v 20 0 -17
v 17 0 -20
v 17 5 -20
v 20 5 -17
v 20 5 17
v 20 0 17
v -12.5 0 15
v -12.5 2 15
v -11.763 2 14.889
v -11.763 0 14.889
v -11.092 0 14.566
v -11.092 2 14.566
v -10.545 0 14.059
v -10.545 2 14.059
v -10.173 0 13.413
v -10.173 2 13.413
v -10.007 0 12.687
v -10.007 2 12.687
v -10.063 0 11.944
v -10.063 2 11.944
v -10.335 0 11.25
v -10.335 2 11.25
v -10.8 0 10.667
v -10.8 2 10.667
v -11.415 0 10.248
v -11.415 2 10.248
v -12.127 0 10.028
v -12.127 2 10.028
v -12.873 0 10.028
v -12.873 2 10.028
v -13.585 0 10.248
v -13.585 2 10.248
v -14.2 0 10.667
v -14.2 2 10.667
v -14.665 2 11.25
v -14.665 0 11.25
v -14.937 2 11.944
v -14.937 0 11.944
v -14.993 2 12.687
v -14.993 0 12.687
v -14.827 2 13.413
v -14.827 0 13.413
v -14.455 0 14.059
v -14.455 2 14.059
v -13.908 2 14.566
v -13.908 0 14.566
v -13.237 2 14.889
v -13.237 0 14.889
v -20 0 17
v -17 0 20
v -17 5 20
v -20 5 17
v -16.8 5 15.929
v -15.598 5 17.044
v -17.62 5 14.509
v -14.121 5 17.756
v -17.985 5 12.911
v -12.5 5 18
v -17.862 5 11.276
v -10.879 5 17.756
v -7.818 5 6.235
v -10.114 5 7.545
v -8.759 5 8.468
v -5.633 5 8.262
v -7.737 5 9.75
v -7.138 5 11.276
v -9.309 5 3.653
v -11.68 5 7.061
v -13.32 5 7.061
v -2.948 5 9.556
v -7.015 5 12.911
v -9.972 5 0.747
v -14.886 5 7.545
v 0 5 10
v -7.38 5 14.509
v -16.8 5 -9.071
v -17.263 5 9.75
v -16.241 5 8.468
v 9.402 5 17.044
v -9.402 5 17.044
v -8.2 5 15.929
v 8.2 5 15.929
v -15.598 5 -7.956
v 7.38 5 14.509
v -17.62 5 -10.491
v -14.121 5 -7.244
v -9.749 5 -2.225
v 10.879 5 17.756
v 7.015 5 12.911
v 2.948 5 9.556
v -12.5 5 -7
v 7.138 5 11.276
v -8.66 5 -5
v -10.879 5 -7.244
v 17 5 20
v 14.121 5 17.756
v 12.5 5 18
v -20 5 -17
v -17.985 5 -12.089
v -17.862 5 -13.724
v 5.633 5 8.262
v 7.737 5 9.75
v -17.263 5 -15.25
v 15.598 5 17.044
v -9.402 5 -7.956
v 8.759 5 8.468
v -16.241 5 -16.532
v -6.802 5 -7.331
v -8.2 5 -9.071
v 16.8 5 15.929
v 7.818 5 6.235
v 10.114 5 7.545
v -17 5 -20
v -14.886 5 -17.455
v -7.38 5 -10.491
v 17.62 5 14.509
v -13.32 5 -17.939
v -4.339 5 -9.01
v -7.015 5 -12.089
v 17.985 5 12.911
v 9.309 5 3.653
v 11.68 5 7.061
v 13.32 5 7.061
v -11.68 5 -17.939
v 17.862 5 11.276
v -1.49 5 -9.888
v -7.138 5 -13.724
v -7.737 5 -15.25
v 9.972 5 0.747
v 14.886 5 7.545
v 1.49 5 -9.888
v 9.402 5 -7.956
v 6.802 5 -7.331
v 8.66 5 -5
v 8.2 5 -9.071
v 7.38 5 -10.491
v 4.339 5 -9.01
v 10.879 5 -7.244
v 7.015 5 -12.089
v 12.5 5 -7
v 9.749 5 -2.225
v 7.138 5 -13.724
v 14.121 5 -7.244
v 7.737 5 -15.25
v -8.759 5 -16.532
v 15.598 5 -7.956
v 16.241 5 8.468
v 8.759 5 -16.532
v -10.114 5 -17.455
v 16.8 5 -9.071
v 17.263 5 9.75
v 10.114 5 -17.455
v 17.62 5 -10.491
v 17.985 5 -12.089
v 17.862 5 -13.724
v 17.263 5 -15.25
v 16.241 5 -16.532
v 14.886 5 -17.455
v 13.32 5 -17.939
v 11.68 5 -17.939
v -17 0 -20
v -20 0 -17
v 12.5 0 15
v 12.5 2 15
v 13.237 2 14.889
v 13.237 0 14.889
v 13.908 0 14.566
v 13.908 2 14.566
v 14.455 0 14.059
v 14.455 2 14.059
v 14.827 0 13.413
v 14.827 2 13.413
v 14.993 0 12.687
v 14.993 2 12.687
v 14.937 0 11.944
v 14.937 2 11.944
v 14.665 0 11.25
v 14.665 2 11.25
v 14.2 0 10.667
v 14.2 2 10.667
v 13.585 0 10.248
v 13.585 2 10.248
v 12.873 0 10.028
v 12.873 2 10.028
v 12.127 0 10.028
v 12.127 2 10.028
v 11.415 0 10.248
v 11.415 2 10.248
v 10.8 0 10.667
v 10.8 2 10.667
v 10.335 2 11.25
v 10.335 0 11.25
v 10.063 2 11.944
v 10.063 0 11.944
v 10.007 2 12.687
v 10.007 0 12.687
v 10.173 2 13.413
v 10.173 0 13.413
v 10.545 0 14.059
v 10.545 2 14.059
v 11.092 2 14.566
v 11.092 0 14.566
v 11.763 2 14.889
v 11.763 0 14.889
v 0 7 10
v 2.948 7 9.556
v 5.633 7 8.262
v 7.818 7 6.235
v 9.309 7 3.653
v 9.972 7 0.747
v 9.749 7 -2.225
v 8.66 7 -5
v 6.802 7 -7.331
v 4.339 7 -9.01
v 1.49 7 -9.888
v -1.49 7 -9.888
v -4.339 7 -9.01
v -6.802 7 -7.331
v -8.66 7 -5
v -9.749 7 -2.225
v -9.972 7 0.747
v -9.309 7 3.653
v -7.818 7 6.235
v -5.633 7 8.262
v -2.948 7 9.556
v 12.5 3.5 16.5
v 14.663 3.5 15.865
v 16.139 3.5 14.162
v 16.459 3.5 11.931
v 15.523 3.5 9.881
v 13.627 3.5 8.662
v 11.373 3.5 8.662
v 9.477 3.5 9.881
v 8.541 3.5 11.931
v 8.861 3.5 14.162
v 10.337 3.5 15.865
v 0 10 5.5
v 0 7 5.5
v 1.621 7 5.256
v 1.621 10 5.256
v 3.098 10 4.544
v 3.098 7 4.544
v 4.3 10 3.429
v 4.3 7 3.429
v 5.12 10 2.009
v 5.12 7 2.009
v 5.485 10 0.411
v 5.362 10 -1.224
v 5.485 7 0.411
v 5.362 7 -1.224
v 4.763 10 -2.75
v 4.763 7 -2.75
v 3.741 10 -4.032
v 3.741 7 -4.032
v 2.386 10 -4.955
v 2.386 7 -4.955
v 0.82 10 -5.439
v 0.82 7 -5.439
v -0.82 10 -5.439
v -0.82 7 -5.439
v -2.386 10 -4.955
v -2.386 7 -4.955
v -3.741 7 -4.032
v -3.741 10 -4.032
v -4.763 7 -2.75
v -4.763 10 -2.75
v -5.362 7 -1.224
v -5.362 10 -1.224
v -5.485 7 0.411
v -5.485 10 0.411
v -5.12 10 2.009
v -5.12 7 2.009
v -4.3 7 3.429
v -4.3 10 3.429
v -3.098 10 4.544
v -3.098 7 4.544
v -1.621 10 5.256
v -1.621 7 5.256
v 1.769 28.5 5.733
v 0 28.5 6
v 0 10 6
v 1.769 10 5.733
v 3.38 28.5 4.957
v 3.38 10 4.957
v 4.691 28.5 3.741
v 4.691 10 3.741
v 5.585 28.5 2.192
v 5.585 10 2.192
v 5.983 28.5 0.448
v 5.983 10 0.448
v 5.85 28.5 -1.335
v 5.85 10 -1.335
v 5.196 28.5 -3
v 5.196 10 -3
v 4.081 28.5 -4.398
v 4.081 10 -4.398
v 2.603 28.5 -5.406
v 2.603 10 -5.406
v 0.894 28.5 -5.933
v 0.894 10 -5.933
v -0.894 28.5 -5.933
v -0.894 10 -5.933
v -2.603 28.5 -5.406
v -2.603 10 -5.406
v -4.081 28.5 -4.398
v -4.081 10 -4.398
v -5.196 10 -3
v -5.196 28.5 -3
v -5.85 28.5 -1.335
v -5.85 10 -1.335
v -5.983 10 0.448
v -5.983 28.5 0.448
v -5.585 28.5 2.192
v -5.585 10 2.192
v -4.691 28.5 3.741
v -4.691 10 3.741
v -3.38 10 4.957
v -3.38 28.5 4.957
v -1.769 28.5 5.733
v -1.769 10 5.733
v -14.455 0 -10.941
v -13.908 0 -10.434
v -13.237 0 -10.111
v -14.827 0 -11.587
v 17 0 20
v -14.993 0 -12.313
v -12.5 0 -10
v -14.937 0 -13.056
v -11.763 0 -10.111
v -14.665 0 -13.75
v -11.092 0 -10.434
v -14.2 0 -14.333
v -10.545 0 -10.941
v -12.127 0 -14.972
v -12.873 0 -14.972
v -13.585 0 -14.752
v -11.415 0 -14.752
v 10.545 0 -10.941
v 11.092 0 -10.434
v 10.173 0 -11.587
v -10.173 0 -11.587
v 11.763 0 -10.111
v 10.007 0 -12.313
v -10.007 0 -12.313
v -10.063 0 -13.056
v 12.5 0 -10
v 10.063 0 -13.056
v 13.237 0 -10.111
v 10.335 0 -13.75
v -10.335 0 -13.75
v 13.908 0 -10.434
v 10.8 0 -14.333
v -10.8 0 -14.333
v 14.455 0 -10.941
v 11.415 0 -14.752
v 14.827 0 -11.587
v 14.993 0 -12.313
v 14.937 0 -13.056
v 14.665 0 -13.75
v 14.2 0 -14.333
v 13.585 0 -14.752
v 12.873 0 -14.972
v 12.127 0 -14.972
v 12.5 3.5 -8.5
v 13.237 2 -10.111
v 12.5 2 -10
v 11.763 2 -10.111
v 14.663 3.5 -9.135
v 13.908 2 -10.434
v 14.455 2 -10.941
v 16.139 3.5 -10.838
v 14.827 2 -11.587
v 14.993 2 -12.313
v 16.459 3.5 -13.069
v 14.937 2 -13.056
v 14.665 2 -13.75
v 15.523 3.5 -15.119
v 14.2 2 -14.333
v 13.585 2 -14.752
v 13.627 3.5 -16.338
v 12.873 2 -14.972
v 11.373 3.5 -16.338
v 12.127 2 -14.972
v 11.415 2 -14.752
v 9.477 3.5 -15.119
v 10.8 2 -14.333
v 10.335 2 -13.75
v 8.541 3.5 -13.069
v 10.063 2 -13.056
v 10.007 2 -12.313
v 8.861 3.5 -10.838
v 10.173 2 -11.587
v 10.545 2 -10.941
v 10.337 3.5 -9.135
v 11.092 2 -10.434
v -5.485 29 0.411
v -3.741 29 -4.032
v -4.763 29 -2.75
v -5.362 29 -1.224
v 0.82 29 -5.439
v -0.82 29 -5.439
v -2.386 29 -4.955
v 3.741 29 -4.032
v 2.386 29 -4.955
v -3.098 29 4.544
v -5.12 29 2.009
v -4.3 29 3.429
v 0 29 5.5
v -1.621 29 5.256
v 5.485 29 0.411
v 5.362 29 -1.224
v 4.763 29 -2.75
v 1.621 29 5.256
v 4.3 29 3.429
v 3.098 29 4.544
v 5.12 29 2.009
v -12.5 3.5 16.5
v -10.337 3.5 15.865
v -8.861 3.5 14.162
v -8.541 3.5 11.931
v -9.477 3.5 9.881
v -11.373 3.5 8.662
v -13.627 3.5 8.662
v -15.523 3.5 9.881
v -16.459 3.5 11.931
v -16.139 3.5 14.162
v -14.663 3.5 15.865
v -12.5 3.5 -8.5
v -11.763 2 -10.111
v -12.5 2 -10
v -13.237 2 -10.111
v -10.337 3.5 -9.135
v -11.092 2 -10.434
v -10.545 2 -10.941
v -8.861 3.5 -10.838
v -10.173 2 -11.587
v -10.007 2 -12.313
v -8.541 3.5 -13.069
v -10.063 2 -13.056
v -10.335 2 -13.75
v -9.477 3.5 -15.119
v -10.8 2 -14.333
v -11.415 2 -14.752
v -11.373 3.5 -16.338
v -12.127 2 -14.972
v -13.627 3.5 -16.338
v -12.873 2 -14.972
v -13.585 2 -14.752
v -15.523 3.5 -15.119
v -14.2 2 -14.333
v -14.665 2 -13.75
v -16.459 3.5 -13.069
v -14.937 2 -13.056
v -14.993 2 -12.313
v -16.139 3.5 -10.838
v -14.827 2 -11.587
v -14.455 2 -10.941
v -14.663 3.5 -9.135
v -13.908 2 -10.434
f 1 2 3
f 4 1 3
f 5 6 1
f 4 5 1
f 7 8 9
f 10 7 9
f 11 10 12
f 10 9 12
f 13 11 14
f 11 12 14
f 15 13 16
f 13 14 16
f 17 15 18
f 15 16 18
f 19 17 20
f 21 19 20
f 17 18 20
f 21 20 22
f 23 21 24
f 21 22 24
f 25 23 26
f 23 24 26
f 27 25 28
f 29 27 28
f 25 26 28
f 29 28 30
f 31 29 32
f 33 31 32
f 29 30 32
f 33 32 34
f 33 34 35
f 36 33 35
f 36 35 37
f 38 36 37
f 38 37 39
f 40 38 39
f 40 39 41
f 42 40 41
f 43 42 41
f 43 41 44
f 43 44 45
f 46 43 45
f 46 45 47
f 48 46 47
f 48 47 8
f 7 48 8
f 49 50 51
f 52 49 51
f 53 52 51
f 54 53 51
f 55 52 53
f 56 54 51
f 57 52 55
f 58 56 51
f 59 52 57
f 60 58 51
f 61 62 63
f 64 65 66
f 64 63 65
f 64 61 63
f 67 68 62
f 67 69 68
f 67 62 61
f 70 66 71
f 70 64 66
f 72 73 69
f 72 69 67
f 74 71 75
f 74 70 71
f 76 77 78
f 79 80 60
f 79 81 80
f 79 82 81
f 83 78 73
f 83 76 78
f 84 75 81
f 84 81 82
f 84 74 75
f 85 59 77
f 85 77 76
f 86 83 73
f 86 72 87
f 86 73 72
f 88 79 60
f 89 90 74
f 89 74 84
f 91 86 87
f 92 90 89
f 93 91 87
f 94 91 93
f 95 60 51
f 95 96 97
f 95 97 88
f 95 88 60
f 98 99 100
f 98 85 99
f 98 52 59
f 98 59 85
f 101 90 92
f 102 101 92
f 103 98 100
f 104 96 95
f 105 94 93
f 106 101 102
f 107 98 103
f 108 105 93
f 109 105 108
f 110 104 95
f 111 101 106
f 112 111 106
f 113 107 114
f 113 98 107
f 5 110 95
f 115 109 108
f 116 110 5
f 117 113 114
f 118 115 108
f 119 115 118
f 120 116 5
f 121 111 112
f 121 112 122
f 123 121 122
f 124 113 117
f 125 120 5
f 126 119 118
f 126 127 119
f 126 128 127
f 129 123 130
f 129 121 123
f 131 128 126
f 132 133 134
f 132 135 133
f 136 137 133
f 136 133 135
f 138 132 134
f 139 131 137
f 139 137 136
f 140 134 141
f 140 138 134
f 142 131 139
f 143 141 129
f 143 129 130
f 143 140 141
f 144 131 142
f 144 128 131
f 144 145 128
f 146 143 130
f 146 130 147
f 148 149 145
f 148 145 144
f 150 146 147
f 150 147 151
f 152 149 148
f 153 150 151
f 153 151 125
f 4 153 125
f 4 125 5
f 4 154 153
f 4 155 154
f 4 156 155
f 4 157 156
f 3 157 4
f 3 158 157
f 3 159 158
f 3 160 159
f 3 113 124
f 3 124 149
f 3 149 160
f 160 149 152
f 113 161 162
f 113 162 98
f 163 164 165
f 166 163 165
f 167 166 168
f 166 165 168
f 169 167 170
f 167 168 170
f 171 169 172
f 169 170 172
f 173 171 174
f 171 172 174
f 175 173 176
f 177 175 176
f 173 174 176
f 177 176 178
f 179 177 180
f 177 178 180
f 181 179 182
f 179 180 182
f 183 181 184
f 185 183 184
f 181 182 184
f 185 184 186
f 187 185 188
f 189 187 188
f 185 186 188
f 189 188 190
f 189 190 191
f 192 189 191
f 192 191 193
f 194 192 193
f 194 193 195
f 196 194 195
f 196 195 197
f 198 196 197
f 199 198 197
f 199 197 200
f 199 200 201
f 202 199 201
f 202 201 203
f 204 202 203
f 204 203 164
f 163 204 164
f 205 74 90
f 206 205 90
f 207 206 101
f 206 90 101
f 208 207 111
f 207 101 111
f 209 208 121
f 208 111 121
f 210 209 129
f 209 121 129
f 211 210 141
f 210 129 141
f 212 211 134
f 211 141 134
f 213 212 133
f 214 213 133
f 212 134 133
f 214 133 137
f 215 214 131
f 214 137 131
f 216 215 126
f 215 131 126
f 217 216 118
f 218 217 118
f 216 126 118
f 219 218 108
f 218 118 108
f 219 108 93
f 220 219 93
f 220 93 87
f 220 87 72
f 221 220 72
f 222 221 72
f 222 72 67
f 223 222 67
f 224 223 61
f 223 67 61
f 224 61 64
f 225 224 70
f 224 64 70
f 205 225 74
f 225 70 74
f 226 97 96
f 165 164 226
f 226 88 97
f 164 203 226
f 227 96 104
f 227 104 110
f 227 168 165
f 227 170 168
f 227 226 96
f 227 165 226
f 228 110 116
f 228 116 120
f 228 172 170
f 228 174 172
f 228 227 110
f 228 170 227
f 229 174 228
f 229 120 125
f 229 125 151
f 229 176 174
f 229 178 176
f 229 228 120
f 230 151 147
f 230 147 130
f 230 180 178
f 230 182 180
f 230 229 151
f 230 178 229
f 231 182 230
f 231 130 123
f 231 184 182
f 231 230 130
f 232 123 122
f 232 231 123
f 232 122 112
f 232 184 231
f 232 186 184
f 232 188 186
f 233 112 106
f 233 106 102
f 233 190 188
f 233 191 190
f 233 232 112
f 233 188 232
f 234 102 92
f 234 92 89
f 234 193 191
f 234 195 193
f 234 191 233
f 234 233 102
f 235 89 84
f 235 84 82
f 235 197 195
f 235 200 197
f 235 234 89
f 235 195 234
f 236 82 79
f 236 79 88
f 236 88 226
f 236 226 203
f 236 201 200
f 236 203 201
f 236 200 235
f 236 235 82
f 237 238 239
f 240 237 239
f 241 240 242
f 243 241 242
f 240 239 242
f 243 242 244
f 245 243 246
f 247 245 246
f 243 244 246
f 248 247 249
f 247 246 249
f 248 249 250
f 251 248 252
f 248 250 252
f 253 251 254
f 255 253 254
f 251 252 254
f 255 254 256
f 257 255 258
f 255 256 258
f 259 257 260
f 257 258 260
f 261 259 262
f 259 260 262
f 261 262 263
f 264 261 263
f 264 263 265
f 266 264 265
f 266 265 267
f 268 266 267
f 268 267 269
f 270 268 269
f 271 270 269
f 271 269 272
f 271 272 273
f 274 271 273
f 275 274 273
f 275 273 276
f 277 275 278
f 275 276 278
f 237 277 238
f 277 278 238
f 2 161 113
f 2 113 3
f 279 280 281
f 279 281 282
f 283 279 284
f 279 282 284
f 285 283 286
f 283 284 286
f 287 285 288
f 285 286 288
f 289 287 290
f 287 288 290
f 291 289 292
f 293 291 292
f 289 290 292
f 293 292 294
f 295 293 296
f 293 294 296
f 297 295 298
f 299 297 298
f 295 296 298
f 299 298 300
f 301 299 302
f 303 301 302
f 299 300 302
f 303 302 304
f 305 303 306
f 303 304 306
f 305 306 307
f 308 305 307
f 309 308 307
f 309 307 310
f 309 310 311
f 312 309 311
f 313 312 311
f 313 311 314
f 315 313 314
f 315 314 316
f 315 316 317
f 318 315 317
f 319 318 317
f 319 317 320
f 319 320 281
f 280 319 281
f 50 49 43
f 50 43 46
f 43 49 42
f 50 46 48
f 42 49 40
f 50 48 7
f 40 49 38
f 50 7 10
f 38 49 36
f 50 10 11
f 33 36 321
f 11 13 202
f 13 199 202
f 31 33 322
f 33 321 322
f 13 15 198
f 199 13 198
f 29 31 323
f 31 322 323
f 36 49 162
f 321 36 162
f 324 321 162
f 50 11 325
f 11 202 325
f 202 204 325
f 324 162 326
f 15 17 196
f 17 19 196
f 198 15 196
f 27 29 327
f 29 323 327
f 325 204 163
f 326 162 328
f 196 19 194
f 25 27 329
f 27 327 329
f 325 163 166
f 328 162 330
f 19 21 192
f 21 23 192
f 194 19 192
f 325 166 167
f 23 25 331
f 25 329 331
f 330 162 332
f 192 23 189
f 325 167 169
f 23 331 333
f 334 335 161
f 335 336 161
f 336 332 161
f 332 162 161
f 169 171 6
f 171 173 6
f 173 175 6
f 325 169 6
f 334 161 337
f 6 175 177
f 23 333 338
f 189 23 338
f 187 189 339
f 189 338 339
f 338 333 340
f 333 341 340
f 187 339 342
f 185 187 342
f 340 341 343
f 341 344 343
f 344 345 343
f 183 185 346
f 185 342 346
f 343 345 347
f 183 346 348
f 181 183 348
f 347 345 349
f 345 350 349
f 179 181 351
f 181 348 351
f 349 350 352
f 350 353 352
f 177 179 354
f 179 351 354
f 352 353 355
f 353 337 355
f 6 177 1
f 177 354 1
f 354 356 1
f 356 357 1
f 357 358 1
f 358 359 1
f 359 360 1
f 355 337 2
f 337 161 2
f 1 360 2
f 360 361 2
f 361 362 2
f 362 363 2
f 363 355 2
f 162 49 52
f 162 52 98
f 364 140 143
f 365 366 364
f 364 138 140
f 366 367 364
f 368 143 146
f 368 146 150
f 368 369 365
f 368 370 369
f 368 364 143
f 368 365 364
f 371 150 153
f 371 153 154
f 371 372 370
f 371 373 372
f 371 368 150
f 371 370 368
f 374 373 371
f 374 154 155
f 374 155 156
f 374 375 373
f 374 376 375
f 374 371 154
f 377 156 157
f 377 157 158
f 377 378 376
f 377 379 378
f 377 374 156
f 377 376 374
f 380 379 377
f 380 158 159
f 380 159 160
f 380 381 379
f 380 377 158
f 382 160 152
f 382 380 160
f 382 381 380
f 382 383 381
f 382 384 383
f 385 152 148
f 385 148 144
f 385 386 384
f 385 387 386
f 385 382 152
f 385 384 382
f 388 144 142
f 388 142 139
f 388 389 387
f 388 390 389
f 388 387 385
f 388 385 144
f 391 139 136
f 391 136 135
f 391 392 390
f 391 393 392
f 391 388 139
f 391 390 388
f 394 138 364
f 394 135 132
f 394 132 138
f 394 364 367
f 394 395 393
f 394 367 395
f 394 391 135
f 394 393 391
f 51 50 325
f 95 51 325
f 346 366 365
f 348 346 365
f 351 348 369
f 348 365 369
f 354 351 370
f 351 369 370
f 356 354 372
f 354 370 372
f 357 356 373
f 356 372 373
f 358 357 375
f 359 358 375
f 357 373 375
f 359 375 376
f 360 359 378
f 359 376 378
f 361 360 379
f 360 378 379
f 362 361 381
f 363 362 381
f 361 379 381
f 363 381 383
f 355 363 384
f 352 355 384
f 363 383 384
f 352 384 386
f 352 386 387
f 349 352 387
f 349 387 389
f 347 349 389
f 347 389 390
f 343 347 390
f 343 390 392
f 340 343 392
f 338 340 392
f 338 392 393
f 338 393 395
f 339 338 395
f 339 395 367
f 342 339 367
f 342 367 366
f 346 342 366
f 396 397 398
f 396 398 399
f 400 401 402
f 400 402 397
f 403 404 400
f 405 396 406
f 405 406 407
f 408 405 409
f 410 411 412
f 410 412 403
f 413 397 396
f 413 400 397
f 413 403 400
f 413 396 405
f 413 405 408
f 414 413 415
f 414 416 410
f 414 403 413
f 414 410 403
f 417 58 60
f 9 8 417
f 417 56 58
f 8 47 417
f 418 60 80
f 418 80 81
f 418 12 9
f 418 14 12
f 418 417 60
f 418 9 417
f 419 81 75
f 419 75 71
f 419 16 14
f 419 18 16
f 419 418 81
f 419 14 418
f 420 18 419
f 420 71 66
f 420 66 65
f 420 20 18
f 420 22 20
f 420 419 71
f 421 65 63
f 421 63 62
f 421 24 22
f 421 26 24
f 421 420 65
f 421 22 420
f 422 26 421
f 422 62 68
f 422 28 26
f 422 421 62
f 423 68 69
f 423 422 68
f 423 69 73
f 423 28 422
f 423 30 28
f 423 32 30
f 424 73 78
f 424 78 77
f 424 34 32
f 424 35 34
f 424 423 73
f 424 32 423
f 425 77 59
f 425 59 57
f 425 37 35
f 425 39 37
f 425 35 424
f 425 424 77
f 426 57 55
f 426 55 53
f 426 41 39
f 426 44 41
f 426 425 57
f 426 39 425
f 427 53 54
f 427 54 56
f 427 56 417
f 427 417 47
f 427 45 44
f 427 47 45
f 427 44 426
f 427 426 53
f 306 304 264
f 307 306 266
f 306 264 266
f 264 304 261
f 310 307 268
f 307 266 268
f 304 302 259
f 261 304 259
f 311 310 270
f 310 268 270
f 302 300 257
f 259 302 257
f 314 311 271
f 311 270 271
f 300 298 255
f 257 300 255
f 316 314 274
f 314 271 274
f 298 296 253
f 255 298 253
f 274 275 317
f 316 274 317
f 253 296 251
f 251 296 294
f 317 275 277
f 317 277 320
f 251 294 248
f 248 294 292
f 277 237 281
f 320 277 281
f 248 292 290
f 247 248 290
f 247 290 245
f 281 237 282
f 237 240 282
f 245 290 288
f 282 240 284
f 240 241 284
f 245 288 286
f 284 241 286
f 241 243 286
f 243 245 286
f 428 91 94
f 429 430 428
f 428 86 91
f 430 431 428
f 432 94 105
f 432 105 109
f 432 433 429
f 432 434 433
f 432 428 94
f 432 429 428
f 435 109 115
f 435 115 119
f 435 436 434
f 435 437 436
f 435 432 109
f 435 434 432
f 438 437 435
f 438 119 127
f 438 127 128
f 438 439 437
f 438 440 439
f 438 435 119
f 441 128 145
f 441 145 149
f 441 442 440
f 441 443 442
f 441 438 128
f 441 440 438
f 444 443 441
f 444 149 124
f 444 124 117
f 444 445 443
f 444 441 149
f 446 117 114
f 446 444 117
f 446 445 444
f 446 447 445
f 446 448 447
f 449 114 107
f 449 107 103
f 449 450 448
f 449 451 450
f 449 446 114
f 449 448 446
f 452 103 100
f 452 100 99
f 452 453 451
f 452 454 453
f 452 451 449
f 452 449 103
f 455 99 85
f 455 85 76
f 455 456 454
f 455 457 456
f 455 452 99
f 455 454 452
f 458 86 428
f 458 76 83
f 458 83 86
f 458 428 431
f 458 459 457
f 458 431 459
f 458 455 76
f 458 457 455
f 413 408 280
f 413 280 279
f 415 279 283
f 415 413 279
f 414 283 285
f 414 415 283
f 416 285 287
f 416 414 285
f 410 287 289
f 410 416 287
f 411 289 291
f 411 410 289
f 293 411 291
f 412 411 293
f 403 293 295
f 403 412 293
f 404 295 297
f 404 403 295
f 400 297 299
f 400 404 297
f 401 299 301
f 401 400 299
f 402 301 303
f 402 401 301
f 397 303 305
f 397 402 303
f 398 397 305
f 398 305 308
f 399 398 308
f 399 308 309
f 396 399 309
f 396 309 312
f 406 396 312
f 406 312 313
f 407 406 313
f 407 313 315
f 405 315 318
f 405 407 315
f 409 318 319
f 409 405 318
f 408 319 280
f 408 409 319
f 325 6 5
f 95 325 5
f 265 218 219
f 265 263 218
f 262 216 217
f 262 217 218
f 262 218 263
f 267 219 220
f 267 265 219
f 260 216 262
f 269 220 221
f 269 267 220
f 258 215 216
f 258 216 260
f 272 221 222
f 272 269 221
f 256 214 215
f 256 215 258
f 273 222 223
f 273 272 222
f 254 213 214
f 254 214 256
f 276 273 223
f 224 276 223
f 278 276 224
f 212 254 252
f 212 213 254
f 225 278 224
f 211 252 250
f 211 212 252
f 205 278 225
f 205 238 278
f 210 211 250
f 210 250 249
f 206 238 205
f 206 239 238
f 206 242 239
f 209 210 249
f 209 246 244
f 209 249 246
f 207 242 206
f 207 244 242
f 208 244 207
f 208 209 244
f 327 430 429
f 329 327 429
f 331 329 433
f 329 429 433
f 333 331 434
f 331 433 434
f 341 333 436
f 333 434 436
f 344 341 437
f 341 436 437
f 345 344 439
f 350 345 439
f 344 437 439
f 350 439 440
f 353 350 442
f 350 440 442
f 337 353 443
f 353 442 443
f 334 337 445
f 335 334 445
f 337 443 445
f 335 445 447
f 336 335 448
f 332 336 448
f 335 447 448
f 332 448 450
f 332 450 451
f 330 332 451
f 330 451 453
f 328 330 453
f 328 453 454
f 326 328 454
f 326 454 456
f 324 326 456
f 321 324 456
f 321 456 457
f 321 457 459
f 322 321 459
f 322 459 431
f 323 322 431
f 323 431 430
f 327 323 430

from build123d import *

# Parameters (mm, degrees)
SKETCH_1_W          = 40
SKETCH_1_H          = 40
EXTRUDE_1_DEPTH     = 5
CHAMFER_1_SIZE      = 3
SKETCH_2_R          = 10
EXTRUDE_2_DEPTH     = 2
SKETCH_3_R          = 6
EXTRUDE_3_DEPTH     = 22
SKETCH_4_R          = 6
SKETCH_4_R_2        = 5.5
CUT_EXTRUDE_1_DEPTH = 3
SKETCH_5_R          = 2.5
CUT_EXTRUDE_2_DEPTH = 38.094473982
CHAMFER_2_SIZE      = 3
CHAMFER_3_SIZE      = 0.5


with BuildPart() as part:
    # Эскиз1 → Бобышка-Вытянуть1 (new body)
    with BuildSketch(Plane(origin=(0, 0, 0), x_dir=(1, 0, 0), z_dir=(0, 1, 0))):
        Rectangle(SKETCH_1_W, SKETCH_1_H)
    extrude(amount=EXTRUDE_1_DEPTH)

    # Фаска1
    chamfer_1_edges = [part.edges().sort_by_distance(p)[0] for p in [
        (20, 2.5, 20),
        (-20, 2.5, 20),
        (-20, 2.5, -20),
        (20, 2.5, -20),
    ]]
    chamfer(chamfer_1_edges, length=CHAMFER_1_SIZE)

    # Эскиз2 → Бобышка-Вытянуть2 (add)
    with BuildSketch(Plane(origin=(0, 5, 0), x_dir=(1, 0, 0), z_dir=(0, 1, 0))):
        with Locations(Location((0, 0, 0), (0, 0, 270))):
            Circle(SKETCH_2_R)
    extrude(amount=EXTRUDE_2_DEPTH)

    # Эскиз3 → Бобышка-Вытянуть3 (add)
    with BuildSketch(Plane(origin=(0, 7, 0), x_dir=(1, 0, 0), z_dir=(0, 1, 0))):
        with Locations(Location((0, 0, 0), (0, 0, 270))):
            Circle(SKETCH_3_R)
    extrude(amount=EXTRUDE_3_DEPTH)

    # Эскиз4 → Вырез-Вытянуть1 (cut)
    with BuildSketch(Plane(origin=(0, 7, 0), x_dir=(1, 0, 0), z_dir=(0, 1, 0))):
        with Locations(Location((0, 0, 0), (0, 0, 270))):
            Circle(SKETCH_4_R)
        with Locations(Location((0, 0, 0), (0, 0, 270))):
            Circle(SKETCH_4_R_2, mode=Mode.SUBTRACT)
    extrude(amount=CUT_EXTRUDE_1_DEPTH, mode=Mode.SUBTRACT)

    # Эскиз5 → Вырез-Вытянуть2 (cut, through all)
    with BuildSketch(Plane(origin=(0, 5, 0), x_dir=(1, 0, 0), z_dir=(0, 1, 0))):
        with Locations(Location((-12.5, 12.5, 0), (0, 0, 270))):
            Circle(SKETCH_5_R)
        with Locations(Location((12.5, 12.5, 0), (0, 0, 270))):
            Circle(SKETCH_5_R)
        with Locations(Location((12.5, -12.5, 0), (0, 0, 270))):
            Circle(SKETCH_5_R)
        with Locations(Location((-12.5, -12.5, 0), (0, 0, 270))):
            Circle(SKETCH_5_R)
    extrude(amount=-CUT_EXTRUDE_2_DEPTH, mode=Mode.SUBTRACT)

    # Фаска2
    chamfer_2_edges = [part.edges().sort_by_distance(p)[0] for p in [
        (-12.5, 5, 10),
        (12.5, 5, 10),
        (12.5, 5, -15),
        (-12.5, 5, -15),
    ]]
    chamfer(chamfer_2_edges, length=CHAMFER_2_SIZE)

    # Фаска3
    chamfer_3_edges = [part.edges().sort_by_distance(p)[0] for p in [
        (0, 29, -6),
    ]]
    chamfer(chamfer_3_edges, length=CHAMFER_3_SIZE)


solid = part.part
